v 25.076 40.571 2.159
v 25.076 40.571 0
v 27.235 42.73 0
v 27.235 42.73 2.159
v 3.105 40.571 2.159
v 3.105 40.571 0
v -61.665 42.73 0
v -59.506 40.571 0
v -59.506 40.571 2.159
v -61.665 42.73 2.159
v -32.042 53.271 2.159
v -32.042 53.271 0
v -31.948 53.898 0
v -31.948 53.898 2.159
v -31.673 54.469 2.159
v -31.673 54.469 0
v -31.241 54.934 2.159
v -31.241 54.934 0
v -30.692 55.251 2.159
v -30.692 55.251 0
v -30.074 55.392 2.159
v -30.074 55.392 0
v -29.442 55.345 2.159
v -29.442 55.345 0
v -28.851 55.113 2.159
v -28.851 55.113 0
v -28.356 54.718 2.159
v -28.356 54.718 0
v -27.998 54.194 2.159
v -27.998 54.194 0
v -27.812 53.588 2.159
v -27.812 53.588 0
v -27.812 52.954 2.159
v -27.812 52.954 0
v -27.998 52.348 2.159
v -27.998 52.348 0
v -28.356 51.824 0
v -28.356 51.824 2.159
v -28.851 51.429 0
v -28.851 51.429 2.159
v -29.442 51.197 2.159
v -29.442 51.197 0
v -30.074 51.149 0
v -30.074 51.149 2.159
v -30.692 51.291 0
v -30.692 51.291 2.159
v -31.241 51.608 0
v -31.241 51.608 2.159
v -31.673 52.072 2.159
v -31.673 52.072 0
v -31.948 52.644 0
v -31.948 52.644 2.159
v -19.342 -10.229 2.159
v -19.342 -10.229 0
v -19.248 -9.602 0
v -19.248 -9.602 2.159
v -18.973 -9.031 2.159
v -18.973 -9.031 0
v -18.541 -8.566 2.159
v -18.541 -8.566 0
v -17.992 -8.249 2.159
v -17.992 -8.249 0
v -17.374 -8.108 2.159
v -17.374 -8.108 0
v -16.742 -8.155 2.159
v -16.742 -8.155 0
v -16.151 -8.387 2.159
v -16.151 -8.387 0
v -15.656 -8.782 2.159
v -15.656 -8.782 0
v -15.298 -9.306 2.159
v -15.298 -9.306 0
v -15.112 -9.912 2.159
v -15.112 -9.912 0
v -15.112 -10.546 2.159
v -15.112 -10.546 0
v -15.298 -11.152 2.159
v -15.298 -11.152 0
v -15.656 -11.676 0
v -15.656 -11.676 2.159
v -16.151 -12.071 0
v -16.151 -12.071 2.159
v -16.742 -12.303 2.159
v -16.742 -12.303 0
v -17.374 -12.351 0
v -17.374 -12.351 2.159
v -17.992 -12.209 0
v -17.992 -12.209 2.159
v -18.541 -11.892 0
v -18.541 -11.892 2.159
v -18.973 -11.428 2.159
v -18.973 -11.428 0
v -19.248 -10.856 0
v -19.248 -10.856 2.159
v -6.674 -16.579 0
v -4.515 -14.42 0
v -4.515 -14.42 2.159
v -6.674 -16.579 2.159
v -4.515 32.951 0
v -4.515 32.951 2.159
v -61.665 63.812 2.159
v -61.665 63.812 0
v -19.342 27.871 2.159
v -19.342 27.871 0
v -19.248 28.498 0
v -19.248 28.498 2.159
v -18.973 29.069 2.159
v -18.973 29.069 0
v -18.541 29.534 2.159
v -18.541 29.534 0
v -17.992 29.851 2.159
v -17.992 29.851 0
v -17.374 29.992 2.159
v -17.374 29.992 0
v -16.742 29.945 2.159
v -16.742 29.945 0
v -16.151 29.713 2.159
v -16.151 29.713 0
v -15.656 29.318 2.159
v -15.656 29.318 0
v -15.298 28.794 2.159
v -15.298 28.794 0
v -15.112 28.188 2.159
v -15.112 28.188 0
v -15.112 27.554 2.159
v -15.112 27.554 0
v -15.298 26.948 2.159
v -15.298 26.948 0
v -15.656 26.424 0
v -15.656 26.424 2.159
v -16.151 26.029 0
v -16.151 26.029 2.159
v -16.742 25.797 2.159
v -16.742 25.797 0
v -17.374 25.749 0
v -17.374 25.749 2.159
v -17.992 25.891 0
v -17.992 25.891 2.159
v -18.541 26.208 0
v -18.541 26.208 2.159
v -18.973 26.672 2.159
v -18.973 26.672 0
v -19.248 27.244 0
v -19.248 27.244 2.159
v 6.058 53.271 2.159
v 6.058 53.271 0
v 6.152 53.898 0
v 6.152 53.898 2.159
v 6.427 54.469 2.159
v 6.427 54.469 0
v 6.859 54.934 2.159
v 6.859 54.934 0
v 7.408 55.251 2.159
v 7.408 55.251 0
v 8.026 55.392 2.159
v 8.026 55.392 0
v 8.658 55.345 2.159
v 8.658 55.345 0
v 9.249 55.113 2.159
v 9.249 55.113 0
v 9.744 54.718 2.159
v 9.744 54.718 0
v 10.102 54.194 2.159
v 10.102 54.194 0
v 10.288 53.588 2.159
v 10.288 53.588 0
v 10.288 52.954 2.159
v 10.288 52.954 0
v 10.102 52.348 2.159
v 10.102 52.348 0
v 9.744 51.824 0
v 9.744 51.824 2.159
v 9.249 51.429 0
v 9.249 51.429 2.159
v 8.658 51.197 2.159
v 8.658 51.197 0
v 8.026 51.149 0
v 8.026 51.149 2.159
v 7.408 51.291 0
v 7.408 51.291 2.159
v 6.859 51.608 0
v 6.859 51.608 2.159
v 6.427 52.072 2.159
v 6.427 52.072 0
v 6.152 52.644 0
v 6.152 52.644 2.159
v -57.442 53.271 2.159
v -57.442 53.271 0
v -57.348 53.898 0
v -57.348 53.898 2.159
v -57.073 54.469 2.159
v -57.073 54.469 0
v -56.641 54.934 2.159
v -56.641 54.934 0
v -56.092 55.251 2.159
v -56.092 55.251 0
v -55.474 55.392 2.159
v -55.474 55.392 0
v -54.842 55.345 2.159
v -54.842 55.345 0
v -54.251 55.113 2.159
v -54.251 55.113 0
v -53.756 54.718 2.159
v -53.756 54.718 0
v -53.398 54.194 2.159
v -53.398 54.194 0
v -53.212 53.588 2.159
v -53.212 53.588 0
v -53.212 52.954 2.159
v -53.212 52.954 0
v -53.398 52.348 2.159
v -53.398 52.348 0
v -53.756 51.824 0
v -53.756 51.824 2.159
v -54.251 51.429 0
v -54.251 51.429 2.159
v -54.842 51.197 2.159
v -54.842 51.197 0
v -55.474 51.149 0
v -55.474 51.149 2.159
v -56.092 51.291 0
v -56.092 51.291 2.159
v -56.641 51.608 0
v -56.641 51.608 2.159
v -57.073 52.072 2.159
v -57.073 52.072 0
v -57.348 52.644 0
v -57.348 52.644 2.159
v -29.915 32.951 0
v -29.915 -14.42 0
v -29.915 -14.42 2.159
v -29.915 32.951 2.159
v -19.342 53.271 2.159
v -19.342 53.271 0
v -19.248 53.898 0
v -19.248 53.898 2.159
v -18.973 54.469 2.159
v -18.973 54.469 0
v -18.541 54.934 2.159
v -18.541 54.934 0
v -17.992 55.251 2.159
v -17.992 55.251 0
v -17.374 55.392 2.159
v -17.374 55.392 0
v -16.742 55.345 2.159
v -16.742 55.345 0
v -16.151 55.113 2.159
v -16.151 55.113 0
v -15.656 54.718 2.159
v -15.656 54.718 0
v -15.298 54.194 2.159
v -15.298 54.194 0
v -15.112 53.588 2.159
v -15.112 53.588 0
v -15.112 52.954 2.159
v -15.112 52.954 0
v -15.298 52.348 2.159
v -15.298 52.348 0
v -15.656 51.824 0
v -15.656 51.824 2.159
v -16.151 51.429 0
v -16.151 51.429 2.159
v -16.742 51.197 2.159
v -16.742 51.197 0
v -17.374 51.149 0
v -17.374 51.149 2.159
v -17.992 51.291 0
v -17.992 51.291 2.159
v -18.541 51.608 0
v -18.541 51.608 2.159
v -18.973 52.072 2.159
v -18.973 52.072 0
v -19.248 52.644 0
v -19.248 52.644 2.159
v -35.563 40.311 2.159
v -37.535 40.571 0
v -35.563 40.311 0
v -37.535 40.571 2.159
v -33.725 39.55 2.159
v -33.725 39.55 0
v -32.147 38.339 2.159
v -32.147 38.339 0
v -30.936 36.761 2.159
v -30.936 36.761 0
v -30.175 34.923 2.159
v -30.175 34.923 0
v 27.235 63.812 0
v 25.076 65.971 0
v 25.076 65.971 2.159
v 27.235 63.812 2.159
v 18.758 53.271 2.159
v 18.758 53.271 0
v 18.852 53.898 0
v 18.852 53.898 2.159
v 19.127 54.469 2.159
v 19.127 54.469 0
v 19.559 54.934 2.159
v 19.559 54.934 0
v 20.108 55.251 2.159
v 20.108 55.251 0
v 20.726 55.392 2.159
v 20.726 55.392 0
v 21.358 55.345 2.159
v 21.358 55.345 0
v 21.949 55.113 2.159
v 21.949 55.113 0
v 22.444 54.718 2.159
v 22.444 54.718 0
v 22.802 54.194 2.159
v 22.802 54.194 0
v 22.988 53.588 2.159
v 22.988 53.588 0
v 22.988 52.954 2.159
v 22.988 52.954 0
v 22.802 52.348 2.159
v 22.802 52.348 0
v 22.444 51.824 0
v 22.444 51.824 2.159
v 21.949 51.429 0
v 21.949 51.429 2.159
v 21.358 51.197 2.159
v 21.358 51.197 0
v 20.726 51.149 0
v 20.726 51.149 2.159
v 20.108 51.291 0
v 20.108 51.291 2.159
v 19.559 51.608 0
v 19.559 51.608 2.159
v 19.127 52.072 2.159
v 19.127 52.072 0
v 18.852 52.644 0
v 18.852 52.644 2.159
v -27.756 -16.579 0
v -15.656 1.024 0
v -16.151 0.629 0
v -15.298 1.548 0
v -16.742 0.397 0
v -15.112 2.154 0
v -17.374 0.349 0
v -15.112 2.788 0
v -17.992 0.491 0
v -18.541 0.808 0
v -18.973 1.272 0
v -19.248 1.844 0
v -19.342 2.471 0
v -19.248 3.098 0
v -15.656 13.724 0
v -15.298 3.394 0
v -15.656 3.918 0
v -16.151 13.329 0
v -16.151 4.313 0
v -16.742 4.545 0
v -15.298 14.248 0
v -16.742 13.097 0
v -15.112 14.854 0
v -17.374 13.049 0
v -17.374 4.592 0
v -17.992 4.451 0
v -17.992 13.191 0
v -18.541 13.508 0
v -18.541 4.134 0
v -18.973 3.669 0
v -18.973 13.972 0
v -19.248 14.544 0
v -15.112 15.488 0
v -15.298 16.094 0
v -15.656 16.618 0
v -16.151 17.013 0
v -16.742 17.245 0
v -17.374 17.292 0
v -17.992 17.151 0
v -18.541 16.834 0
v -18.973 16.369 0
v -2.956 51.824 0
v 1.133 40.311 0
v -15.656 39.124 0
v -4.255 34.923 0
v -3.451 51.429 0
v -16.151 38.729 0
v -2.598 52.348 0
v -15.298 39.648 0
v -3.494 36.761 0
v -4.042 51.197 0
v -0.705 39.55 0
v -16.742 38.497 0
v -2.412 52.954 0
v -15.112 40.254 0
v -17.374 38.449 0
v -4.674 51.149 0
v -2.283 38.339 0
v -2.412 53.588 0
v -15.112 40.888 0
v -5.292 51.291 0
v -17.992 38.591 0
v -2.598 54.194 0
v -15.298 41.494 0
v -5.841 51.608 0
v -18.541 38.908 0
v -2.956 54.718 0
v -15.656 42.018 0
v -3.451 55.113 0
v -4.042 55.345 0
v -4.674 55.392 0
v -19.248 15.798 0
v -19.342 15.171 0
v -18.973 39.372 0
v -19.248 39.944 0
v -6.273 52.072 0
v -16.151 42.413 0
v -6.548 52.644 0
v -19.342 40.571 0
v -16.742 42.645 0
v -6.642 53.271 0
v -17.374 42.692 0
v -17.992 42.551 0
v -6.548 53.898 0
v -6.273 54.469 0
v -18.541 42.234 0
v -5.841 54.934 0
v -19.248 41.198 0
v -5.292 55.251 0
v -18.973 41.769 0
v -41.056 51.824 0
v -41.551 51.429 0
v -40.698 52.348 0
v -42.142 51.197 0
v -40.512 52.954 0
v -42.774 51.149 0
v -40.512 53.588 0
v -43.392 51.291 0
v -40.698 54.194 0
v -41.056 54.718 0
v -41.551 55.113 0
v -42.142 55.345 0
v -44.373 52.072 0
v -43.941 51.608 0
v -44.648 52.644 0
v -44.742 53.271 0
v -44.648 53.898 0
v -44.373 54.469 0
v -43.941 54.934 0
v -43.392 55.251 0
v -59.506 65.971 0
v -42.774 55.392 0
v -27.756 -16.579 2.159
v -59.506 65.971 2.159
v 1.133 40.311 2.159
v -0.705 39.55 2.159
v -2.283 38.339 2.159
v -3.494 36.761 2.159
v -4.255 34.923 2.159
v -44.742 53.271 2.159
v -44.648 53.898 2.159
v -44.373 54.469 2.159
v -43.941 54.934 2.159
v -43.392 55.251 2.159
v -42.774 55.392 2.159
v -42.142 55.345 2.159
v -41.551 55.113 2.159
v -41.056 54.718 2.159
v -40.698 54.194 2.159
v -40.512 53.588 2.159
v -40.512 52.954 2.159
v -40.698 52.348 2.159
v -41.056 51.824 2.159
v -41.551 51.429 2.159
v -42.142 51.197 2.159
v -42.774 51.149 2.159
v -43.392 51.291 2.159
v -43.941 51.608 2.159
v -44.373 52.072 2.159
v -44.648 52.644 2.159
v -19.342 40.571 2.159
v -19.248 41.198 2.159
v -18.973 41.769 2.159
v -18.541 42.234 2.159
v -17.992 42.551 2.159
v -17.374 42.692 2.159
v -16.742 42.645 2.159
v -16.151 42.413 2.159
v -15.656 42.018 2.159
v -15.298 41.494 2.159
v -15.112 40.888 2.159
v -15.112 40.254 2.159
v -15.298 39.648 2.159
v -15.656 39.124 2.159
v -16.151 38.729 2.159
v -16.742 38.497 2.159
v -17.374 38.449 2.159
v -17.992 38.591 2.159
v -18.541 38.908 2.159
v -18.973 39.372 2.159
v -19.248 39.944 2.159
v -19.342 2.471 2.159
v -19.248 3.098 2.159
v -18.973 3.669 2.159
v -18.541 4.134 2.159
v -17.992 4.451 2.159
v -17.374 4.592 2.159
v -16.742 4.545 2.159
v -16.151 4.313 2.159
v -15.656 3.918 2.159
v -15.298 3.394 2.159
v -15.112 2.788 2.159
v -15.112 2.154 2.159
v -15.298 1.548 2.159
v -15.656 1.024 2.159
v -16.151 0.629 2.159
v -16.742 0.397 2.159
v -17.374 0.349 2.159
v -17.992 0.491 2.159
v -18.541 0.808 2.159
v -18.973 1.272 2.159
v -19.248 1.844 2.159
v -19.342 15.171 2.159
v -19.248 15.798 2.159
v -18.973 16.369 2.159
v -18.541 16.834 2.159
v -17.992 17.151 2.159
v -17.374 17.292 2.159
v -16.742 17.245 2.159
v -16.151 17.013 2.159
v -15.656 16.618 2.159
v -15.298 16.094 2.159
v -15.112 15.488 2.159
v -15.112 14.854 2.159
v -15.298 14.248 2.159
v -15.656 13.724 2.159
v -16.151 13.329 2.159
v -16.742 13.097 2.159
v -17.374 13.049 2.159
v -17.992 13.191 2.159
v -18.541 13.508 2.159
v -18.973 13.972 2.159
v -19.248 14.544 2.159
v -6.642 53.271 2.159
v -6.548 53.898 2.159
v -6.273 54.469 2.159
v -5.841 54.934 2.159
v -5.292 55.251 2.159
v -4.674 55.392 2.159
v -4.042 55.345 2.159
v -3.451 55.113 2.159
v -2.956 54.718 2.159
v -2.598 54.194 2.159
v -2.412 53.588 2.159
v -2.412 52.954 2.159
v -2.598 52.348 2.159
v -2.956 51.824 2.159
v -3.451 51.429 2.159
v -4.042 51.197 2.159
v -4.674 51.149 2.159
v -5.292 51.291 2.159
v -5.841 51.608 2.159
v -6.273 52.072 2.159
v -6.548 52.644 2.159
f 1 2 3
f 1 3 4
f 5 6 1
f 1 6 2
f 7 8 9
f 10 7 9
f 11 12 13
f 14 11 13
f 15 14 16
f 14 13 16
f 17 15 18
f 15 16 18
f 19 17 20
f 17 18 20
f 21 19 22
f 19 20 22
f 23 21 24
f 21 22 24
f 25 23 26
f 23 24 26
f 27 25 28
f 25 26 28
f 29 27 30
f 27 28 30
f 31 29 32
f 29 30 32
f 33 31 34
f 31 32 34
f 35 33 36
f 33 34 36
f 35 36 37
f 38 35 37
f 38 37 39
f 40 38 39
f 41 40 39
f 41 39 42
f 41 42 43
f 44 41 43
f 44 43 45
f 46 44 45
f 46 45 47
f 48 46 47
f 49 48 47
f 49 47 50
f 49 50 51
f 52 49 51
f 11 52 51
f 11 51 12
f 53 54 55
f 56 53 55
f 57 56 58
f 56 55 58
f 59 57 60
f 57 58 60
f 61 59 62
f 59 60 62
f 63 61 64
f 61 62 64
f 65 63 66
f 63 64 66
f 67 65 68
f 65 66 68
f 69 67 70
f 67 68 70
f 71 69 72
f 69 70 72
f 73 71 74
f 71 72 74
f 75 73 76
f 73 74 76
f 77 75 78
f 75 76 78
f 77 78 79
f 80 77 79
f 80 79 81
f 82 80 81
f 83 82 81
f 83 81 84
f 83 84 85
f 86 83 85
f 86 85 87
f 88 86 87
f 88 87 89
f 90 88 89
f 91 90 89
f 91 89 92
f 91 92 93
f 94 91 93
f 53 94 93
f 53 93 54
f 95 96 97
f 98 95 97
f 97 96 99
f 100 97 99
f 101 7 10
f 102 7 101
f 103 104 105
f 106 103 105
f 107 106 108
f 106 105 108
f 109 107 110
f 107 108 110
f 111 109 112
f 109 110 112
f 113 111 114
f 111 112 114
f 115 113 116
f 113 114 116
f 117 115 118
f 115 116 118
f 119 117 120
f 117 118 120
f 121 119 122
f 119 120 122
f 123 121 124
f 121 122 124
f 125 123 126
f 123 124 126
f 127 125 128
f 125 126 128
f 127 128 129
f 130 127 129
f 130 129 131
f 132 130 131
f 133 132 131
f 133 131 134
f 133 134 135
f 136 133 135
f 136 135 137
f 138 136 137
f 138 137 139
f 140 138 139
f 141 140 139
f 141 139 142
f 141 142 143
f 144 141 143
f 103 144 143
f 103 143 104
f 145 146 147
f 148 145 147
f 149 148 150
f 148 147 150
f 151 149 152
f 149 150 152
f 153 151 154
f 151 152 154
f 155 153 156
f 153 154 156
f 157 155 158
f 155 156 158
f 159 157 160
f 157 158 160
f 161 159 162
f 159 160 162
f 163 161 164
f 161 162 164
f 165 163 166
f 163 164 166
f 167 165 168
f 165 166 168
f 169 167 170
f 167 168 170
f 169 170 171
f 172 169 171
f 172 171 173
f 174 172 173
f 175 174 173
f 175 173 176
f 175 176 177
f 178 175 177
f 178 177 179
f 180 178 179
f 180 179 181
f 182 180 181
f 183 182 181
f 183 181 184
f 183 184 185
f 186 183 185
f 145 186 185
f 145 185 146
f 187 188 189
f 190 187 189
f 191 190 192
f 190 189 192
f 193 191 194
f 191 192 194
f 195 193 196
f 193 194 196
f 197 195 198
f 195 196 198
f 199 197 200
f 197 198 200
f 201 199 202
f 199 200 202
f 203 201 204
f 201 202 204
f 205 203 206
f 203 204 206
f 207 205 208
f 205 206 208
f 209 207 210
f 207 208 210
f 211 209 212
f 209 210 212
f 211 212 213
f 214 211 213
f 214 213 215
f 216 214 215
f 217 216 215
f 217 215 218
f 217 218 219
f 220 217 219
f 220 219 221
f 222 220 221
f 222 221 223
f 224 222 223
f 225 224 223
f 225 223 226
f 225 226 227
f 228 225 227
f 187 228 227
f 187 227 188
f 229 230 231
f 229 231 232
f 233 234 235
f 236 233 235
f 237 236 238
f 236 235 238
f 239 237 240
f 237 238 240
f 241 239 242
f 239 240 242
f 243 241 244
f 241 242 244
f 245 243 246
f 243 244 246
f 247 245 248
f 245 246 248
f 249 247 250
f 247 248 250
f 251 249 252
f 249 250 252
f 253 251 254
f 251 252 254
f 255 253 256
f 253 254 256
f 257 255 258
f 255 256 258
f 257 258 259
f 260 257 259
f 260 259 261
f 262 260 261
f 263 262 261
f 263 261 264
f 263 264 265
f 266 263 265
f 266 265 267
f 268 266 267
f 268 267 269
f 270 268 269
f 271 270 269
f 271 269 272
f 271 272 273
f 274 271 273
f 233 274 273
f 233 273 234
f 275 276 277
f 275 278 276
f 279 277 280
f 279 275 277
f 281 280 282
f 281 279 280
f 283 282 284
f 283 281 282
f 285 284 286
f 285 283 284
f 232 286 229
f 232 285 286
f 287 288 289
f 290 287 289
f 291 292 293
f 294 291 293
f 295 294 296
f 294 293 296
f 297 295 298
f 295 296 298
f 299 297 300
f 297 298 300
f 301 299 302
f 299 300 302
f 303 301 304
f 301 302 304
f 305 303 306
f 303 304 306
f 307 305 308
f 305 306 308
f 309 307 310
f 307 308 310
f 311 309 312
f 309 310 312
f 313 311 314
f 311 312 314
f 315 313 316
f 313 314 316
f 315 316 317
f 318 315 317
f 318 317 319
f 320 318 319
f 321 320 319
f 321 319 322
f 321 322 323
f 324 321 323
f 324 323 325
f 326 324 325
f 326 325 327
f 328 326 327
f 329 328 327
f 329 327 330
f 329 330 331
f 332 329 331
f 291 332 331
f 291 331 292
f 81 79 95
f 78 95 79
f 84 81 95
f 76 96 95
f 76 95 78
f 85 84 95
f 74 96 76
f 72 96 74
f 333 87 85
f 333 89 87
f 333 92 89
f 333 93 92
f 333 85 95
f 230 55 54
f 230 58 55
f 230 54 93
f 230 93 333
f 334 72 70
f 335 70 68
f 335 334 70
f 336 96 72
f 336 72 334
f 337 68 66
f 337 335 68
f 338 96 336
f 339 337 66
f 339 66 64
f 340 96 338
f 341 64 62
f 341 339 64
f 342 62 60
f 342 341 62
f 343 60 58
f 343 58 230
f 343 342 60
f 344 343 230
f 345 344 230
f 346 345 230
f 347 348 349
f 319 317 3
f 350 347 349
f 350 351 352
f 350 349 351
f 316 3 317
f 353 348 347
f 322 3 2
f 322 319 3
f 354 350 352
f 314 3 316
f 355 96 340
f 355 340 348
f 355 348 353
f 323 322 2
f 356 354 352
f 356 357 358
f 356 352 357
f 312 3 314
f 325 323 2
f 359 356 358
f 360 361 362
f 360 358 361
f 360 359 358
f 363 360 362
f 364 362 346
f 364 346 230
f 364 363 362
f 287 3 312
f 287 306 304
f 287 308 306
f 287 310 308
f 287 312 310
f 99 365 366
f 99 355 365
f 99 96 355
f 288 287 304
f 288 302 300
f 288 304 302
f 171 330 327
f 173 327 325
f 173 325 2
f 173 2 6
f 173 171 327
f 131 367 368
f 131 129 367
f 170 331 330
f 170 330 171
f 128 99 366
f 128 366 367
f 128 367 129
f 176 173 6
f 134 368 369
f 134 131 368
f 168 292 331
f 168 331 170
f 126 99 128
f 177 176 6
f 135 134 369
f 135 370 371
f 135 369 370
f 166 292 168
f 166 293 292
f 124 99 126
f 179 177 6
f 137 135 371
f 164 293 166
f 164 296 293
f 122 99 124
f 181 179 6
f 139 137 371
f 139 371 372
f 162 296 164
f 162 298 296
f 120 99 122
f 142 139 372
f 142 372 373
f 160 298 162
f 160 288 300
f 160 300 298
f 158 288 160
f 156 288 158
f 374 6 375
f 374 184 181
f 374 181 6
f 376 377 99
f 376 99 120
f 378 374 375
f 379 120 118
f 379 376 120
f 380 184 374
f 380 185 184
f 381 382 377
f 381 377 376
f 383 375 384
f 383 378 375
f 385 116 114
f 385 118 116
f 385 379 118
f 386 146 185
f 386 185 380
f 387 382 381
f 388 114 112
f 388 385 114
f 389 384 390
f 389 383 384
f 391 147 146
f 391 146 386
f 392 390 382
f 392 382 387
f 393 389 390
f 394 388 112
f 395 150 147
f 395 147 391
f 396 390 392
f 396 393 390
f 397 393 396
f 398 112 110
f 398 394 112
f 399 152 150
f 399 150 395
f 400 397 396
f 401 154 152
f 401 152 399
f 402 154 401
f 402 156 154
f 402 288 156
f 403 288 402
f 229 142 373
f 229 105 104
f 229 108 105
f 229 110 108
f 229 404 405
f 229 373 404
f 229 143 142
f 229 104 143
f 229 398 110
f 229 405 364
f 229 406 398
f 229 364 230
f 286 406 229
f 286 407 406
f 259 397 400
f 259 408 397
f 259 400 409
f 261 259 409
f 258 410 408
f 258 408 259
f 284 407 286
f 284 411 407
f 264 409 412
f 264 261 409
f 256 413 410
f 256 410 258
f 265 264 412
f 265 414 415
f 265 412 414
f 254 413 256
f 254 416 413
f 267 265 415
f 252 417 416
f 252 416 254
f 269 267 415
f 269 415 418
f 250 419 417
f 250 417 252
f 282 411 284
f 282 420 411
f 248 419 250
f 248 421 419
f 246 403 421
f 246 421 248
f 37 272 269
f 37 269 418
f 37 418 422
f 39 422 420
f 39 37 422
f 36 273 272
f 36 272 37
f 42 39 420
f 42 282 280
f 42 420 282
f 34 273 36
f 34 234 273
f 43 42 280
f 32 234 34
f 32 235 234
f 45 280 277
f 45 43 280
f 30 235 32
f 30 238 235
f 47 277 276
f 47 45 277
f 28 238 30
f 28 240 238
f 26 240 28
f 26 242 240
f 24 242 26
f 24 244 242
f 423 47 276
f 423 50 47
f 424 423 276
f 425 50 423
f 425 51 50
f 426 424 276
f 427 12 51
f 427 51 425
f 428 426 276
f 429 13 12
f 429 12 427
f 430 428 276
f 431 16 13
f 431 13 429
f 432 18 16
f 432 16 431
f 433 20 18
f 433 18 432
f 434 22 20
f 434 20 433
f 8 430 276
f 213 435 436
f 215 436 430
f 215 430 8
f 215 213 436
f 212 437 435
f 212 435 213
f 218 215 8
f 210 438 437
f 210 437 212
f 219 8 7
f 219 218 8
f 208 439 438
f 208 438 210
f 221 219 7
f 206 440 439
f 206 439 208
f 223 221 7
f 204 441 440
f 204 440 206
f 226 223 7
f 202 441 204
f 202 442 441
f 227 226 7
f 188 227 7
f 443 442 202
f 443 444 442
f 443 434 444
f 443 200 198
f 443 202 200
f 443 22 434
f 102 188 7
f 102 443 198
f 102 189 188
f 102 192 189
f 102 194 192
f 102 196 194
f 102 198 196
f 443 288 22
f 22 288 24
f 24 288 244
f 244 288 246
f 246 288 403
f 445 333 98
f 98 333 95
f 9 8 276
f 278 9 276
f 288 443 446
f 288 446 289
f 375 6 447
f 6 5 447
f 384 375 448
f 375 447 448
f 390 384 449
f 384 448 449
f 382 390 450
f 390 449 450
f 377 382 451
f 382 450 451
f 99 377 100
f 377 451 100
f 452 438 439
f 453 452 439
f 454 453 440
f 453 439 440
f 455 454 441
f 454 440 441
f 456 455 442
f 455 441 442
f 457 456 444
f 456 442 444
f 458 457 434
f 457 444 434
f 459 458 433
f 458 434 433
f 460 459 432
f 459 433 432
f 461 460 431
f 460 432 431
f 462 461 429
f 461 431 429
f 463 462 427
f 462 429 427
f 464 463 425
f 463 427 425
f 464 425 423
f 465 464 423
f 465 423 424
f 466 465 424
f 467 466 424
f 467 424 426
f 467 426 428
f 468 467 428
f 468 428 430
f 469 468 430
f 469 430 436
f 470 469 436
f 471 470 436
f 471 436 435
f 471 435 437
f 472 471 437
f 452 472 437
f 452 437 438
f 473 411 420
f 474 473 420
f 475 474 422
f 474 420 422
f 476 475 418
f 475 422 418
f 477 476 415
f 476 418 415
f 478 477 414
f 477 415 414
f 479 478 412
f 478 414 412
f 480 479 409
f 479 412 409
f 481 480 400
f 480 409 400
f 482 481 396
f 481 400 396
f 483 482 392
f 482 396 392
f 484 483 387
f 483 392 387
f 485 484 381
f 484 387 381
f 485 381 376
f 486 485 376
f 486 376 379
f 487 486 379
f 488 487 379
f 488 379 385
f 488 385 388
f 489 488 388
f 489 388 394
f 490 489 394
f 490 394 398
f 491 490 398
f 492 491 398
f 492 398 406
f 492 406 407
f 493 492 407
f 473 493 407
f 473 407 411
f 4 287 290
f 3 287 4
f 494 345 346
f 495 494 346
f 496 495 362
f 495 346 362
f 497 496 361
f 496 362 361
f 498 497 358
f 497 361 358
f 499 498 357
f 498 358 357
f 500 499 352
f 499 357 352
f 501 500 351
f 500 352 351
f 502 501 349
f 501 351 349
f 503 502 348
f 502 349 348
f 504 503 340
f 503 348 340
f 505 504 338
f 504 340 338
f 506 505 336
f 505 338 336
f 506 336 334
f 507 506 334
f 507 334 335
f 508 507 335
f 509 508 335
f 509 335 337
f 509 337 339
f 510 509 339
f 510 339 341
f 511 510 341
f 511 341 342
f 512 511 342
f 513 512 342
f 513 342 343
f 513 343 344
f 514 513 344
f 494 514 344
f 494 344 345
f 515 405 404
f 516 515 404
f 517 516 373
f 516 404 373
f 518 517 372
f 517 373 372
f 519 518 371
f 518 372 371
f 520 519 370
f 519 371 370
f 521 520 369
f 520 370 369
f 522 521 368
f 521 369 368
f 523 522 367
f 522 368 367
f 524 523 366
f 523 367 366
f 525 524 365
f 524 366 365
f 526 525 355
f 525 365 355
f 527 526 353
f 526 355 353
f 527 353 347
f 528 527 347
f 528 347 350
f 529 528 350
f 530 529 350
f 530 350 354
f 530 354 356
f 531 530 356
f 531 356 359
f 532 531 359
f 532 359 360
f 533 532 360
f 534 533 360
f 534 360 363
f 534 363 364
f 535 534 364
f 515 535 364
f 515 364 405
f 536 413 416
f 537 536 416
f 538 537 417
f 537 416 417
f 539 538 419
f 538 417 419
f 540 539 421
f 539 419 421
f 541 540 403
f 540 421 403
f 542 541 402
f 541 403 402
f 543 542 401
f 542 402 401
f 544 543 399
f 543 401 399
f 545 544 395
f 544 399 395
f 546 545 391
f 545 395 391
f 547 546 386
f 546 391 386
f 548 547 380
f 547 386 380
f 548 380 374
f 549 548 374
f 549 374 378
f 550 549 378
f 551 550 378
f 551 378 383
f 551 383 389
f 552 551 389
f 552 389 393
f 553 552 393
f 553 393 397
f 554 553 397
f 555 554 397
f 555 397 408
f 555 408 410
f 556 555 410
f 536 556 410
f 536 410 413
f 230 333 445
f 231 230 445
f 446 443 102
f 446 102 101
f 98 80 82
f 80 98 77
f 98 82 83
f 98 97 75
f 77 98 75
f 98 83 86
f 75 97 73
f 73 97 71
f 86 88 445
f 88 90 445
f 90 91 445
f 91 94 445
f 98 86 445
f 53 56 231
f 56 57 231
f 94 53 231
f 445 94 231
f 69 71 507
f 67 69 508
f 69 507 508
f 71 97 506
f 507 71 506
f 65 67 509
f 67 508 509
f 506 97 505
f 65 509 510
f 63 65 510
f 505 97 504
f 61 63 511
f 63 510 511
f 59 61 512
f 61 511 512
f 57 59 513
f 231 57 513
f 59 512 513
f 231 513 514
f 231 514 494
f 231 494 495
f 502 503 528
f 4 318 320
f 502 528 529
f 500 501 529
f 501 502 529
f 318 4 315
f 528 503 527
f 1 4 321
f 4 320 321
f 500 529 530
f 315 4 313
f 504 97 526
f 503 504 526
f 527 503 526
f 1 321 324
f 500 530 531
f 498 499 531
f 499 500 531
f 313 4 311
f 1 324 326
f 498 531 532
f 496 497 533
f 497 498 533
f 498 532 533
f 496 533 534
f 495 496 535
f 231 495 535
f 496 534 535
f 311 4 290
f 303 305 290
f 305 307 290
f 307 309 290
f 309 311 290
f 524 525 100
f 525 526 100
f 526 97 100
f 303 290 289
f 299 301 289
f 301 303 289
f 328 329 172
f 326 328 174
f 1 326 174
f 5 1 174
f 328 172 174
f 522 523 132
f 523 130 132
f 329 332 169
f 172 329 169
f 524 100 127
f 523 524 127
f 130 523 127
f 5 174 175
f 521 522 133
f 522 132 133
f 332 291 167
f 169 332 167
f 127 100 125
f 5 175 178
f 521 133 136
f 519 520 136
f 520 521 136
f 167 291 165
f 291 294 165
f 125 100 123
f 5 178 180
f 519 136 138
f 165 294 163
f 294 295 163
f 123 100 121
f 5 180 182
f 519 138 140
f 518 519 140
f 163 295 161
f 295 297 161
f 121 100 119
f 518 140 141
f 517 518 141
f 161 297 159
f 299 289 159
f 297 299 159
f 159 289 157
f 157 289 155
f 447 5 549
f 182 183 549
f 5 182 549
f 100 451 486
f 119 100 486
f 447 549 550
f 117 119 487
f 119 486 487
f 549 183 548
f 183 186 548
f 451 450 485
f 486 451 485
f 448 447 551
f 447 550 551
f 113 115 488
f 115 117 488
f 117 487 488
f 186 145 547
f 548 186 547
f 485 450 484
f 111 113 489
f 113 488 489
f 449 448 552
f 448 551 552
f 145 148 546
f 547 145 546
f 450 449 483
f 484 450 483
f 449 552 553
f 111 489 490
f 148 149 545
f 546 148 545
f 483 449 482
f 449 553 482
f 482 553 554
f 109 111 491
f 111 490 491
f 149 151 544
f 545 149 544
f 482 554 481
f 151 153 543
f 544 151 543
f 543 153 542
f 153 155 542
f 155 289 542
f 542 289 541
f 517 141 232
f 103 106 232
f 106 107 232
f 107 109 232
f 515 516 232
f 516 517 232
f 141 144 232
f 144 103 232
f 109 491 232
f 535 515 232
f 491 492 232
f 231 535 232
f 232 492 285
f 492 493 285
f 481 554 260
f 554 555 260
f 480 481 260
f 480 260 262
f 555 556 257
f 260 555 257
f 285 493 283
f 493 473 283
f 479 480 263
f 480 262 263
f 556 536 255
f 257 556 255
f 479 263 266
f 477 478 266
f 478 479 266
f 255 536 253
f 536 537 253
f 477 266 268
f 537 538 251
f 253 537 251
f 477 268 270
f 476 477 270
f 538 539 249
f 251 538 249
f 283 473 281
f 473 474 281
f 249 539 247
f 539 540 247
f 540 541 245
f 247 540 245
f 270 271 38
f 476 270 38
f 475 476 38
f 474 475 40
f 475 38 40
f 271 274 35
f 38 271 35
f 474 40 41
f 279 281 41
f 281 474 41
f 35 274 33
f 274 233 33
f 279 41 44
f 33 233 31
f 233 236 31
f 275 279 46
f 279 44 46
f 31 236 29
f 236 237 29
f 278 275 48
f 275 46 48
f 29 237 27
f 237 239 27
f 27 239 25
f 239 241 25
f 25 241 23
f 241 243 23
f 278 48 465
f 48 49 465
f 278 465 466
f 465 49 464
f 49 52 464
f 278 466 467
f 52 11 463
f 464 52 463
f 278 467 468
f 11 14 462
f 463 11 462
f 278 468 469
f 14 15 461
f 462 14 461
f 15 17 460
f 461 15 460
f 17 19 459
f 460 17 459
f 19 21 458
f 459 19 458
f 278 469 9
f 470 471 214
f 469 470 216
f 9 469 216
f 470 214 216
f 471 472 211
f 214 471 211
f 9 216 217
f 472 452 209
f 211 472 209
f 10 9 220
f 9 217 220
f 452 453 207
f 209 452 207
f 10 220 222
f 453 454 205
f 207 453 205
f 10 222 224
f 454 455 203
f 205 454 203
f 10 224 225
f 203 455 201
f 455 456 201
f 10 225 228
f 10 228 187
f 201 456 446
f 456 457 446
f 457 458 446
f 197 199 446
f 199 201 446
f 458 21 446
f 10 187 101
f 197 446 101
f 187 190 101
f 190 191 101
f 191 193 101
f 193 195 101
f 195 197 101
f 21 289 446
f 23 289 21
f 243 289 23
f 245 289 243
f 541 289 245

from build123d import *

# Parameters (mm, degrees)
SKETCH1_W                   = 25.4
SKETCH1_H                   = 57.15
BOSS_EXTRUDE1_DEPTH         = 2.159
FILLET1_R                   = 7.62
CHAMFER1_SIZE               = 2.159
F_1_4_0_25_DIAMETER_HOLE1_D = 4.2545


with BuildPart() as part:
    # Sketch1 → Boss-Extrude1 (new body)
    with BuildSketch(Plane.XY):
        Polygon((27.234954785, 40.570800108), (-4.515045215, 40.570800108), (-29.915045215, 40.570800108), (-61.665045215, 40.570800108), (-61.665045215, 65.970800108), (27.234954785, 65.970800108), align=None)
        with Locations((-17.215045215, 11.995800108)):
            Rectangle(SKETCH1_W, SKETCH1_H)
    extrude(amount=BOSS_EXTRUDE1_DEPTH)

    # Fillet1
    fillet1_edges = [part.edges().sort_by_distance(p)[0] for p in [
        (-4.515045215, 40.570800108, 1.0795),
        (-29.915045215, 40.570800108, 1.0795),
    ]]
    fillet(fillet1_edges, radius=FILLET1_R)

    # Chamfer1
    chamfer1_edges = [part.edges().sort_by_distance(p)[0] for p in [
        (-4.515045215, -16.579199892, 1.0795),
        (-29.915045215, -16.579199892, 1.0795),
        (-61.665045215, 40.570800108, 1.0795),
        (-61.665045215, 65.970800108, 1.0795),
        (27.234954785, 65.970800108, 1.0795),
        (27.234954785, 40.570800108, 1.0795),
    ]]
    chamfer(chamfer1_edges, length=CHAMFER1_SIZE)

    # 1/4 (0.25) Diameter Hole1 (through all)
    with Locations(Plane.XY.offset(2.159)):
        with Locations((-55.315045215, 53.270800108), (-42.615045215, 53.270800108), (-29.915045215, 53.270800108), (-17.215045215, 53.270800108), (-4.515045215, 53.270800108), (8.184954785, 53.270800108), (20.884954785, 53.270800108), (-17.215045215, 40.570800108), (-17.215045215, 27.870800108), (-17.215045215, 15.170800108), (-17.215045215, 2.470800108), (-17.215045215, -10.229199892)):
            Hole(F_1_4_0_25_DIAMETER_HOLE1_D / 2)


solid = part.part
